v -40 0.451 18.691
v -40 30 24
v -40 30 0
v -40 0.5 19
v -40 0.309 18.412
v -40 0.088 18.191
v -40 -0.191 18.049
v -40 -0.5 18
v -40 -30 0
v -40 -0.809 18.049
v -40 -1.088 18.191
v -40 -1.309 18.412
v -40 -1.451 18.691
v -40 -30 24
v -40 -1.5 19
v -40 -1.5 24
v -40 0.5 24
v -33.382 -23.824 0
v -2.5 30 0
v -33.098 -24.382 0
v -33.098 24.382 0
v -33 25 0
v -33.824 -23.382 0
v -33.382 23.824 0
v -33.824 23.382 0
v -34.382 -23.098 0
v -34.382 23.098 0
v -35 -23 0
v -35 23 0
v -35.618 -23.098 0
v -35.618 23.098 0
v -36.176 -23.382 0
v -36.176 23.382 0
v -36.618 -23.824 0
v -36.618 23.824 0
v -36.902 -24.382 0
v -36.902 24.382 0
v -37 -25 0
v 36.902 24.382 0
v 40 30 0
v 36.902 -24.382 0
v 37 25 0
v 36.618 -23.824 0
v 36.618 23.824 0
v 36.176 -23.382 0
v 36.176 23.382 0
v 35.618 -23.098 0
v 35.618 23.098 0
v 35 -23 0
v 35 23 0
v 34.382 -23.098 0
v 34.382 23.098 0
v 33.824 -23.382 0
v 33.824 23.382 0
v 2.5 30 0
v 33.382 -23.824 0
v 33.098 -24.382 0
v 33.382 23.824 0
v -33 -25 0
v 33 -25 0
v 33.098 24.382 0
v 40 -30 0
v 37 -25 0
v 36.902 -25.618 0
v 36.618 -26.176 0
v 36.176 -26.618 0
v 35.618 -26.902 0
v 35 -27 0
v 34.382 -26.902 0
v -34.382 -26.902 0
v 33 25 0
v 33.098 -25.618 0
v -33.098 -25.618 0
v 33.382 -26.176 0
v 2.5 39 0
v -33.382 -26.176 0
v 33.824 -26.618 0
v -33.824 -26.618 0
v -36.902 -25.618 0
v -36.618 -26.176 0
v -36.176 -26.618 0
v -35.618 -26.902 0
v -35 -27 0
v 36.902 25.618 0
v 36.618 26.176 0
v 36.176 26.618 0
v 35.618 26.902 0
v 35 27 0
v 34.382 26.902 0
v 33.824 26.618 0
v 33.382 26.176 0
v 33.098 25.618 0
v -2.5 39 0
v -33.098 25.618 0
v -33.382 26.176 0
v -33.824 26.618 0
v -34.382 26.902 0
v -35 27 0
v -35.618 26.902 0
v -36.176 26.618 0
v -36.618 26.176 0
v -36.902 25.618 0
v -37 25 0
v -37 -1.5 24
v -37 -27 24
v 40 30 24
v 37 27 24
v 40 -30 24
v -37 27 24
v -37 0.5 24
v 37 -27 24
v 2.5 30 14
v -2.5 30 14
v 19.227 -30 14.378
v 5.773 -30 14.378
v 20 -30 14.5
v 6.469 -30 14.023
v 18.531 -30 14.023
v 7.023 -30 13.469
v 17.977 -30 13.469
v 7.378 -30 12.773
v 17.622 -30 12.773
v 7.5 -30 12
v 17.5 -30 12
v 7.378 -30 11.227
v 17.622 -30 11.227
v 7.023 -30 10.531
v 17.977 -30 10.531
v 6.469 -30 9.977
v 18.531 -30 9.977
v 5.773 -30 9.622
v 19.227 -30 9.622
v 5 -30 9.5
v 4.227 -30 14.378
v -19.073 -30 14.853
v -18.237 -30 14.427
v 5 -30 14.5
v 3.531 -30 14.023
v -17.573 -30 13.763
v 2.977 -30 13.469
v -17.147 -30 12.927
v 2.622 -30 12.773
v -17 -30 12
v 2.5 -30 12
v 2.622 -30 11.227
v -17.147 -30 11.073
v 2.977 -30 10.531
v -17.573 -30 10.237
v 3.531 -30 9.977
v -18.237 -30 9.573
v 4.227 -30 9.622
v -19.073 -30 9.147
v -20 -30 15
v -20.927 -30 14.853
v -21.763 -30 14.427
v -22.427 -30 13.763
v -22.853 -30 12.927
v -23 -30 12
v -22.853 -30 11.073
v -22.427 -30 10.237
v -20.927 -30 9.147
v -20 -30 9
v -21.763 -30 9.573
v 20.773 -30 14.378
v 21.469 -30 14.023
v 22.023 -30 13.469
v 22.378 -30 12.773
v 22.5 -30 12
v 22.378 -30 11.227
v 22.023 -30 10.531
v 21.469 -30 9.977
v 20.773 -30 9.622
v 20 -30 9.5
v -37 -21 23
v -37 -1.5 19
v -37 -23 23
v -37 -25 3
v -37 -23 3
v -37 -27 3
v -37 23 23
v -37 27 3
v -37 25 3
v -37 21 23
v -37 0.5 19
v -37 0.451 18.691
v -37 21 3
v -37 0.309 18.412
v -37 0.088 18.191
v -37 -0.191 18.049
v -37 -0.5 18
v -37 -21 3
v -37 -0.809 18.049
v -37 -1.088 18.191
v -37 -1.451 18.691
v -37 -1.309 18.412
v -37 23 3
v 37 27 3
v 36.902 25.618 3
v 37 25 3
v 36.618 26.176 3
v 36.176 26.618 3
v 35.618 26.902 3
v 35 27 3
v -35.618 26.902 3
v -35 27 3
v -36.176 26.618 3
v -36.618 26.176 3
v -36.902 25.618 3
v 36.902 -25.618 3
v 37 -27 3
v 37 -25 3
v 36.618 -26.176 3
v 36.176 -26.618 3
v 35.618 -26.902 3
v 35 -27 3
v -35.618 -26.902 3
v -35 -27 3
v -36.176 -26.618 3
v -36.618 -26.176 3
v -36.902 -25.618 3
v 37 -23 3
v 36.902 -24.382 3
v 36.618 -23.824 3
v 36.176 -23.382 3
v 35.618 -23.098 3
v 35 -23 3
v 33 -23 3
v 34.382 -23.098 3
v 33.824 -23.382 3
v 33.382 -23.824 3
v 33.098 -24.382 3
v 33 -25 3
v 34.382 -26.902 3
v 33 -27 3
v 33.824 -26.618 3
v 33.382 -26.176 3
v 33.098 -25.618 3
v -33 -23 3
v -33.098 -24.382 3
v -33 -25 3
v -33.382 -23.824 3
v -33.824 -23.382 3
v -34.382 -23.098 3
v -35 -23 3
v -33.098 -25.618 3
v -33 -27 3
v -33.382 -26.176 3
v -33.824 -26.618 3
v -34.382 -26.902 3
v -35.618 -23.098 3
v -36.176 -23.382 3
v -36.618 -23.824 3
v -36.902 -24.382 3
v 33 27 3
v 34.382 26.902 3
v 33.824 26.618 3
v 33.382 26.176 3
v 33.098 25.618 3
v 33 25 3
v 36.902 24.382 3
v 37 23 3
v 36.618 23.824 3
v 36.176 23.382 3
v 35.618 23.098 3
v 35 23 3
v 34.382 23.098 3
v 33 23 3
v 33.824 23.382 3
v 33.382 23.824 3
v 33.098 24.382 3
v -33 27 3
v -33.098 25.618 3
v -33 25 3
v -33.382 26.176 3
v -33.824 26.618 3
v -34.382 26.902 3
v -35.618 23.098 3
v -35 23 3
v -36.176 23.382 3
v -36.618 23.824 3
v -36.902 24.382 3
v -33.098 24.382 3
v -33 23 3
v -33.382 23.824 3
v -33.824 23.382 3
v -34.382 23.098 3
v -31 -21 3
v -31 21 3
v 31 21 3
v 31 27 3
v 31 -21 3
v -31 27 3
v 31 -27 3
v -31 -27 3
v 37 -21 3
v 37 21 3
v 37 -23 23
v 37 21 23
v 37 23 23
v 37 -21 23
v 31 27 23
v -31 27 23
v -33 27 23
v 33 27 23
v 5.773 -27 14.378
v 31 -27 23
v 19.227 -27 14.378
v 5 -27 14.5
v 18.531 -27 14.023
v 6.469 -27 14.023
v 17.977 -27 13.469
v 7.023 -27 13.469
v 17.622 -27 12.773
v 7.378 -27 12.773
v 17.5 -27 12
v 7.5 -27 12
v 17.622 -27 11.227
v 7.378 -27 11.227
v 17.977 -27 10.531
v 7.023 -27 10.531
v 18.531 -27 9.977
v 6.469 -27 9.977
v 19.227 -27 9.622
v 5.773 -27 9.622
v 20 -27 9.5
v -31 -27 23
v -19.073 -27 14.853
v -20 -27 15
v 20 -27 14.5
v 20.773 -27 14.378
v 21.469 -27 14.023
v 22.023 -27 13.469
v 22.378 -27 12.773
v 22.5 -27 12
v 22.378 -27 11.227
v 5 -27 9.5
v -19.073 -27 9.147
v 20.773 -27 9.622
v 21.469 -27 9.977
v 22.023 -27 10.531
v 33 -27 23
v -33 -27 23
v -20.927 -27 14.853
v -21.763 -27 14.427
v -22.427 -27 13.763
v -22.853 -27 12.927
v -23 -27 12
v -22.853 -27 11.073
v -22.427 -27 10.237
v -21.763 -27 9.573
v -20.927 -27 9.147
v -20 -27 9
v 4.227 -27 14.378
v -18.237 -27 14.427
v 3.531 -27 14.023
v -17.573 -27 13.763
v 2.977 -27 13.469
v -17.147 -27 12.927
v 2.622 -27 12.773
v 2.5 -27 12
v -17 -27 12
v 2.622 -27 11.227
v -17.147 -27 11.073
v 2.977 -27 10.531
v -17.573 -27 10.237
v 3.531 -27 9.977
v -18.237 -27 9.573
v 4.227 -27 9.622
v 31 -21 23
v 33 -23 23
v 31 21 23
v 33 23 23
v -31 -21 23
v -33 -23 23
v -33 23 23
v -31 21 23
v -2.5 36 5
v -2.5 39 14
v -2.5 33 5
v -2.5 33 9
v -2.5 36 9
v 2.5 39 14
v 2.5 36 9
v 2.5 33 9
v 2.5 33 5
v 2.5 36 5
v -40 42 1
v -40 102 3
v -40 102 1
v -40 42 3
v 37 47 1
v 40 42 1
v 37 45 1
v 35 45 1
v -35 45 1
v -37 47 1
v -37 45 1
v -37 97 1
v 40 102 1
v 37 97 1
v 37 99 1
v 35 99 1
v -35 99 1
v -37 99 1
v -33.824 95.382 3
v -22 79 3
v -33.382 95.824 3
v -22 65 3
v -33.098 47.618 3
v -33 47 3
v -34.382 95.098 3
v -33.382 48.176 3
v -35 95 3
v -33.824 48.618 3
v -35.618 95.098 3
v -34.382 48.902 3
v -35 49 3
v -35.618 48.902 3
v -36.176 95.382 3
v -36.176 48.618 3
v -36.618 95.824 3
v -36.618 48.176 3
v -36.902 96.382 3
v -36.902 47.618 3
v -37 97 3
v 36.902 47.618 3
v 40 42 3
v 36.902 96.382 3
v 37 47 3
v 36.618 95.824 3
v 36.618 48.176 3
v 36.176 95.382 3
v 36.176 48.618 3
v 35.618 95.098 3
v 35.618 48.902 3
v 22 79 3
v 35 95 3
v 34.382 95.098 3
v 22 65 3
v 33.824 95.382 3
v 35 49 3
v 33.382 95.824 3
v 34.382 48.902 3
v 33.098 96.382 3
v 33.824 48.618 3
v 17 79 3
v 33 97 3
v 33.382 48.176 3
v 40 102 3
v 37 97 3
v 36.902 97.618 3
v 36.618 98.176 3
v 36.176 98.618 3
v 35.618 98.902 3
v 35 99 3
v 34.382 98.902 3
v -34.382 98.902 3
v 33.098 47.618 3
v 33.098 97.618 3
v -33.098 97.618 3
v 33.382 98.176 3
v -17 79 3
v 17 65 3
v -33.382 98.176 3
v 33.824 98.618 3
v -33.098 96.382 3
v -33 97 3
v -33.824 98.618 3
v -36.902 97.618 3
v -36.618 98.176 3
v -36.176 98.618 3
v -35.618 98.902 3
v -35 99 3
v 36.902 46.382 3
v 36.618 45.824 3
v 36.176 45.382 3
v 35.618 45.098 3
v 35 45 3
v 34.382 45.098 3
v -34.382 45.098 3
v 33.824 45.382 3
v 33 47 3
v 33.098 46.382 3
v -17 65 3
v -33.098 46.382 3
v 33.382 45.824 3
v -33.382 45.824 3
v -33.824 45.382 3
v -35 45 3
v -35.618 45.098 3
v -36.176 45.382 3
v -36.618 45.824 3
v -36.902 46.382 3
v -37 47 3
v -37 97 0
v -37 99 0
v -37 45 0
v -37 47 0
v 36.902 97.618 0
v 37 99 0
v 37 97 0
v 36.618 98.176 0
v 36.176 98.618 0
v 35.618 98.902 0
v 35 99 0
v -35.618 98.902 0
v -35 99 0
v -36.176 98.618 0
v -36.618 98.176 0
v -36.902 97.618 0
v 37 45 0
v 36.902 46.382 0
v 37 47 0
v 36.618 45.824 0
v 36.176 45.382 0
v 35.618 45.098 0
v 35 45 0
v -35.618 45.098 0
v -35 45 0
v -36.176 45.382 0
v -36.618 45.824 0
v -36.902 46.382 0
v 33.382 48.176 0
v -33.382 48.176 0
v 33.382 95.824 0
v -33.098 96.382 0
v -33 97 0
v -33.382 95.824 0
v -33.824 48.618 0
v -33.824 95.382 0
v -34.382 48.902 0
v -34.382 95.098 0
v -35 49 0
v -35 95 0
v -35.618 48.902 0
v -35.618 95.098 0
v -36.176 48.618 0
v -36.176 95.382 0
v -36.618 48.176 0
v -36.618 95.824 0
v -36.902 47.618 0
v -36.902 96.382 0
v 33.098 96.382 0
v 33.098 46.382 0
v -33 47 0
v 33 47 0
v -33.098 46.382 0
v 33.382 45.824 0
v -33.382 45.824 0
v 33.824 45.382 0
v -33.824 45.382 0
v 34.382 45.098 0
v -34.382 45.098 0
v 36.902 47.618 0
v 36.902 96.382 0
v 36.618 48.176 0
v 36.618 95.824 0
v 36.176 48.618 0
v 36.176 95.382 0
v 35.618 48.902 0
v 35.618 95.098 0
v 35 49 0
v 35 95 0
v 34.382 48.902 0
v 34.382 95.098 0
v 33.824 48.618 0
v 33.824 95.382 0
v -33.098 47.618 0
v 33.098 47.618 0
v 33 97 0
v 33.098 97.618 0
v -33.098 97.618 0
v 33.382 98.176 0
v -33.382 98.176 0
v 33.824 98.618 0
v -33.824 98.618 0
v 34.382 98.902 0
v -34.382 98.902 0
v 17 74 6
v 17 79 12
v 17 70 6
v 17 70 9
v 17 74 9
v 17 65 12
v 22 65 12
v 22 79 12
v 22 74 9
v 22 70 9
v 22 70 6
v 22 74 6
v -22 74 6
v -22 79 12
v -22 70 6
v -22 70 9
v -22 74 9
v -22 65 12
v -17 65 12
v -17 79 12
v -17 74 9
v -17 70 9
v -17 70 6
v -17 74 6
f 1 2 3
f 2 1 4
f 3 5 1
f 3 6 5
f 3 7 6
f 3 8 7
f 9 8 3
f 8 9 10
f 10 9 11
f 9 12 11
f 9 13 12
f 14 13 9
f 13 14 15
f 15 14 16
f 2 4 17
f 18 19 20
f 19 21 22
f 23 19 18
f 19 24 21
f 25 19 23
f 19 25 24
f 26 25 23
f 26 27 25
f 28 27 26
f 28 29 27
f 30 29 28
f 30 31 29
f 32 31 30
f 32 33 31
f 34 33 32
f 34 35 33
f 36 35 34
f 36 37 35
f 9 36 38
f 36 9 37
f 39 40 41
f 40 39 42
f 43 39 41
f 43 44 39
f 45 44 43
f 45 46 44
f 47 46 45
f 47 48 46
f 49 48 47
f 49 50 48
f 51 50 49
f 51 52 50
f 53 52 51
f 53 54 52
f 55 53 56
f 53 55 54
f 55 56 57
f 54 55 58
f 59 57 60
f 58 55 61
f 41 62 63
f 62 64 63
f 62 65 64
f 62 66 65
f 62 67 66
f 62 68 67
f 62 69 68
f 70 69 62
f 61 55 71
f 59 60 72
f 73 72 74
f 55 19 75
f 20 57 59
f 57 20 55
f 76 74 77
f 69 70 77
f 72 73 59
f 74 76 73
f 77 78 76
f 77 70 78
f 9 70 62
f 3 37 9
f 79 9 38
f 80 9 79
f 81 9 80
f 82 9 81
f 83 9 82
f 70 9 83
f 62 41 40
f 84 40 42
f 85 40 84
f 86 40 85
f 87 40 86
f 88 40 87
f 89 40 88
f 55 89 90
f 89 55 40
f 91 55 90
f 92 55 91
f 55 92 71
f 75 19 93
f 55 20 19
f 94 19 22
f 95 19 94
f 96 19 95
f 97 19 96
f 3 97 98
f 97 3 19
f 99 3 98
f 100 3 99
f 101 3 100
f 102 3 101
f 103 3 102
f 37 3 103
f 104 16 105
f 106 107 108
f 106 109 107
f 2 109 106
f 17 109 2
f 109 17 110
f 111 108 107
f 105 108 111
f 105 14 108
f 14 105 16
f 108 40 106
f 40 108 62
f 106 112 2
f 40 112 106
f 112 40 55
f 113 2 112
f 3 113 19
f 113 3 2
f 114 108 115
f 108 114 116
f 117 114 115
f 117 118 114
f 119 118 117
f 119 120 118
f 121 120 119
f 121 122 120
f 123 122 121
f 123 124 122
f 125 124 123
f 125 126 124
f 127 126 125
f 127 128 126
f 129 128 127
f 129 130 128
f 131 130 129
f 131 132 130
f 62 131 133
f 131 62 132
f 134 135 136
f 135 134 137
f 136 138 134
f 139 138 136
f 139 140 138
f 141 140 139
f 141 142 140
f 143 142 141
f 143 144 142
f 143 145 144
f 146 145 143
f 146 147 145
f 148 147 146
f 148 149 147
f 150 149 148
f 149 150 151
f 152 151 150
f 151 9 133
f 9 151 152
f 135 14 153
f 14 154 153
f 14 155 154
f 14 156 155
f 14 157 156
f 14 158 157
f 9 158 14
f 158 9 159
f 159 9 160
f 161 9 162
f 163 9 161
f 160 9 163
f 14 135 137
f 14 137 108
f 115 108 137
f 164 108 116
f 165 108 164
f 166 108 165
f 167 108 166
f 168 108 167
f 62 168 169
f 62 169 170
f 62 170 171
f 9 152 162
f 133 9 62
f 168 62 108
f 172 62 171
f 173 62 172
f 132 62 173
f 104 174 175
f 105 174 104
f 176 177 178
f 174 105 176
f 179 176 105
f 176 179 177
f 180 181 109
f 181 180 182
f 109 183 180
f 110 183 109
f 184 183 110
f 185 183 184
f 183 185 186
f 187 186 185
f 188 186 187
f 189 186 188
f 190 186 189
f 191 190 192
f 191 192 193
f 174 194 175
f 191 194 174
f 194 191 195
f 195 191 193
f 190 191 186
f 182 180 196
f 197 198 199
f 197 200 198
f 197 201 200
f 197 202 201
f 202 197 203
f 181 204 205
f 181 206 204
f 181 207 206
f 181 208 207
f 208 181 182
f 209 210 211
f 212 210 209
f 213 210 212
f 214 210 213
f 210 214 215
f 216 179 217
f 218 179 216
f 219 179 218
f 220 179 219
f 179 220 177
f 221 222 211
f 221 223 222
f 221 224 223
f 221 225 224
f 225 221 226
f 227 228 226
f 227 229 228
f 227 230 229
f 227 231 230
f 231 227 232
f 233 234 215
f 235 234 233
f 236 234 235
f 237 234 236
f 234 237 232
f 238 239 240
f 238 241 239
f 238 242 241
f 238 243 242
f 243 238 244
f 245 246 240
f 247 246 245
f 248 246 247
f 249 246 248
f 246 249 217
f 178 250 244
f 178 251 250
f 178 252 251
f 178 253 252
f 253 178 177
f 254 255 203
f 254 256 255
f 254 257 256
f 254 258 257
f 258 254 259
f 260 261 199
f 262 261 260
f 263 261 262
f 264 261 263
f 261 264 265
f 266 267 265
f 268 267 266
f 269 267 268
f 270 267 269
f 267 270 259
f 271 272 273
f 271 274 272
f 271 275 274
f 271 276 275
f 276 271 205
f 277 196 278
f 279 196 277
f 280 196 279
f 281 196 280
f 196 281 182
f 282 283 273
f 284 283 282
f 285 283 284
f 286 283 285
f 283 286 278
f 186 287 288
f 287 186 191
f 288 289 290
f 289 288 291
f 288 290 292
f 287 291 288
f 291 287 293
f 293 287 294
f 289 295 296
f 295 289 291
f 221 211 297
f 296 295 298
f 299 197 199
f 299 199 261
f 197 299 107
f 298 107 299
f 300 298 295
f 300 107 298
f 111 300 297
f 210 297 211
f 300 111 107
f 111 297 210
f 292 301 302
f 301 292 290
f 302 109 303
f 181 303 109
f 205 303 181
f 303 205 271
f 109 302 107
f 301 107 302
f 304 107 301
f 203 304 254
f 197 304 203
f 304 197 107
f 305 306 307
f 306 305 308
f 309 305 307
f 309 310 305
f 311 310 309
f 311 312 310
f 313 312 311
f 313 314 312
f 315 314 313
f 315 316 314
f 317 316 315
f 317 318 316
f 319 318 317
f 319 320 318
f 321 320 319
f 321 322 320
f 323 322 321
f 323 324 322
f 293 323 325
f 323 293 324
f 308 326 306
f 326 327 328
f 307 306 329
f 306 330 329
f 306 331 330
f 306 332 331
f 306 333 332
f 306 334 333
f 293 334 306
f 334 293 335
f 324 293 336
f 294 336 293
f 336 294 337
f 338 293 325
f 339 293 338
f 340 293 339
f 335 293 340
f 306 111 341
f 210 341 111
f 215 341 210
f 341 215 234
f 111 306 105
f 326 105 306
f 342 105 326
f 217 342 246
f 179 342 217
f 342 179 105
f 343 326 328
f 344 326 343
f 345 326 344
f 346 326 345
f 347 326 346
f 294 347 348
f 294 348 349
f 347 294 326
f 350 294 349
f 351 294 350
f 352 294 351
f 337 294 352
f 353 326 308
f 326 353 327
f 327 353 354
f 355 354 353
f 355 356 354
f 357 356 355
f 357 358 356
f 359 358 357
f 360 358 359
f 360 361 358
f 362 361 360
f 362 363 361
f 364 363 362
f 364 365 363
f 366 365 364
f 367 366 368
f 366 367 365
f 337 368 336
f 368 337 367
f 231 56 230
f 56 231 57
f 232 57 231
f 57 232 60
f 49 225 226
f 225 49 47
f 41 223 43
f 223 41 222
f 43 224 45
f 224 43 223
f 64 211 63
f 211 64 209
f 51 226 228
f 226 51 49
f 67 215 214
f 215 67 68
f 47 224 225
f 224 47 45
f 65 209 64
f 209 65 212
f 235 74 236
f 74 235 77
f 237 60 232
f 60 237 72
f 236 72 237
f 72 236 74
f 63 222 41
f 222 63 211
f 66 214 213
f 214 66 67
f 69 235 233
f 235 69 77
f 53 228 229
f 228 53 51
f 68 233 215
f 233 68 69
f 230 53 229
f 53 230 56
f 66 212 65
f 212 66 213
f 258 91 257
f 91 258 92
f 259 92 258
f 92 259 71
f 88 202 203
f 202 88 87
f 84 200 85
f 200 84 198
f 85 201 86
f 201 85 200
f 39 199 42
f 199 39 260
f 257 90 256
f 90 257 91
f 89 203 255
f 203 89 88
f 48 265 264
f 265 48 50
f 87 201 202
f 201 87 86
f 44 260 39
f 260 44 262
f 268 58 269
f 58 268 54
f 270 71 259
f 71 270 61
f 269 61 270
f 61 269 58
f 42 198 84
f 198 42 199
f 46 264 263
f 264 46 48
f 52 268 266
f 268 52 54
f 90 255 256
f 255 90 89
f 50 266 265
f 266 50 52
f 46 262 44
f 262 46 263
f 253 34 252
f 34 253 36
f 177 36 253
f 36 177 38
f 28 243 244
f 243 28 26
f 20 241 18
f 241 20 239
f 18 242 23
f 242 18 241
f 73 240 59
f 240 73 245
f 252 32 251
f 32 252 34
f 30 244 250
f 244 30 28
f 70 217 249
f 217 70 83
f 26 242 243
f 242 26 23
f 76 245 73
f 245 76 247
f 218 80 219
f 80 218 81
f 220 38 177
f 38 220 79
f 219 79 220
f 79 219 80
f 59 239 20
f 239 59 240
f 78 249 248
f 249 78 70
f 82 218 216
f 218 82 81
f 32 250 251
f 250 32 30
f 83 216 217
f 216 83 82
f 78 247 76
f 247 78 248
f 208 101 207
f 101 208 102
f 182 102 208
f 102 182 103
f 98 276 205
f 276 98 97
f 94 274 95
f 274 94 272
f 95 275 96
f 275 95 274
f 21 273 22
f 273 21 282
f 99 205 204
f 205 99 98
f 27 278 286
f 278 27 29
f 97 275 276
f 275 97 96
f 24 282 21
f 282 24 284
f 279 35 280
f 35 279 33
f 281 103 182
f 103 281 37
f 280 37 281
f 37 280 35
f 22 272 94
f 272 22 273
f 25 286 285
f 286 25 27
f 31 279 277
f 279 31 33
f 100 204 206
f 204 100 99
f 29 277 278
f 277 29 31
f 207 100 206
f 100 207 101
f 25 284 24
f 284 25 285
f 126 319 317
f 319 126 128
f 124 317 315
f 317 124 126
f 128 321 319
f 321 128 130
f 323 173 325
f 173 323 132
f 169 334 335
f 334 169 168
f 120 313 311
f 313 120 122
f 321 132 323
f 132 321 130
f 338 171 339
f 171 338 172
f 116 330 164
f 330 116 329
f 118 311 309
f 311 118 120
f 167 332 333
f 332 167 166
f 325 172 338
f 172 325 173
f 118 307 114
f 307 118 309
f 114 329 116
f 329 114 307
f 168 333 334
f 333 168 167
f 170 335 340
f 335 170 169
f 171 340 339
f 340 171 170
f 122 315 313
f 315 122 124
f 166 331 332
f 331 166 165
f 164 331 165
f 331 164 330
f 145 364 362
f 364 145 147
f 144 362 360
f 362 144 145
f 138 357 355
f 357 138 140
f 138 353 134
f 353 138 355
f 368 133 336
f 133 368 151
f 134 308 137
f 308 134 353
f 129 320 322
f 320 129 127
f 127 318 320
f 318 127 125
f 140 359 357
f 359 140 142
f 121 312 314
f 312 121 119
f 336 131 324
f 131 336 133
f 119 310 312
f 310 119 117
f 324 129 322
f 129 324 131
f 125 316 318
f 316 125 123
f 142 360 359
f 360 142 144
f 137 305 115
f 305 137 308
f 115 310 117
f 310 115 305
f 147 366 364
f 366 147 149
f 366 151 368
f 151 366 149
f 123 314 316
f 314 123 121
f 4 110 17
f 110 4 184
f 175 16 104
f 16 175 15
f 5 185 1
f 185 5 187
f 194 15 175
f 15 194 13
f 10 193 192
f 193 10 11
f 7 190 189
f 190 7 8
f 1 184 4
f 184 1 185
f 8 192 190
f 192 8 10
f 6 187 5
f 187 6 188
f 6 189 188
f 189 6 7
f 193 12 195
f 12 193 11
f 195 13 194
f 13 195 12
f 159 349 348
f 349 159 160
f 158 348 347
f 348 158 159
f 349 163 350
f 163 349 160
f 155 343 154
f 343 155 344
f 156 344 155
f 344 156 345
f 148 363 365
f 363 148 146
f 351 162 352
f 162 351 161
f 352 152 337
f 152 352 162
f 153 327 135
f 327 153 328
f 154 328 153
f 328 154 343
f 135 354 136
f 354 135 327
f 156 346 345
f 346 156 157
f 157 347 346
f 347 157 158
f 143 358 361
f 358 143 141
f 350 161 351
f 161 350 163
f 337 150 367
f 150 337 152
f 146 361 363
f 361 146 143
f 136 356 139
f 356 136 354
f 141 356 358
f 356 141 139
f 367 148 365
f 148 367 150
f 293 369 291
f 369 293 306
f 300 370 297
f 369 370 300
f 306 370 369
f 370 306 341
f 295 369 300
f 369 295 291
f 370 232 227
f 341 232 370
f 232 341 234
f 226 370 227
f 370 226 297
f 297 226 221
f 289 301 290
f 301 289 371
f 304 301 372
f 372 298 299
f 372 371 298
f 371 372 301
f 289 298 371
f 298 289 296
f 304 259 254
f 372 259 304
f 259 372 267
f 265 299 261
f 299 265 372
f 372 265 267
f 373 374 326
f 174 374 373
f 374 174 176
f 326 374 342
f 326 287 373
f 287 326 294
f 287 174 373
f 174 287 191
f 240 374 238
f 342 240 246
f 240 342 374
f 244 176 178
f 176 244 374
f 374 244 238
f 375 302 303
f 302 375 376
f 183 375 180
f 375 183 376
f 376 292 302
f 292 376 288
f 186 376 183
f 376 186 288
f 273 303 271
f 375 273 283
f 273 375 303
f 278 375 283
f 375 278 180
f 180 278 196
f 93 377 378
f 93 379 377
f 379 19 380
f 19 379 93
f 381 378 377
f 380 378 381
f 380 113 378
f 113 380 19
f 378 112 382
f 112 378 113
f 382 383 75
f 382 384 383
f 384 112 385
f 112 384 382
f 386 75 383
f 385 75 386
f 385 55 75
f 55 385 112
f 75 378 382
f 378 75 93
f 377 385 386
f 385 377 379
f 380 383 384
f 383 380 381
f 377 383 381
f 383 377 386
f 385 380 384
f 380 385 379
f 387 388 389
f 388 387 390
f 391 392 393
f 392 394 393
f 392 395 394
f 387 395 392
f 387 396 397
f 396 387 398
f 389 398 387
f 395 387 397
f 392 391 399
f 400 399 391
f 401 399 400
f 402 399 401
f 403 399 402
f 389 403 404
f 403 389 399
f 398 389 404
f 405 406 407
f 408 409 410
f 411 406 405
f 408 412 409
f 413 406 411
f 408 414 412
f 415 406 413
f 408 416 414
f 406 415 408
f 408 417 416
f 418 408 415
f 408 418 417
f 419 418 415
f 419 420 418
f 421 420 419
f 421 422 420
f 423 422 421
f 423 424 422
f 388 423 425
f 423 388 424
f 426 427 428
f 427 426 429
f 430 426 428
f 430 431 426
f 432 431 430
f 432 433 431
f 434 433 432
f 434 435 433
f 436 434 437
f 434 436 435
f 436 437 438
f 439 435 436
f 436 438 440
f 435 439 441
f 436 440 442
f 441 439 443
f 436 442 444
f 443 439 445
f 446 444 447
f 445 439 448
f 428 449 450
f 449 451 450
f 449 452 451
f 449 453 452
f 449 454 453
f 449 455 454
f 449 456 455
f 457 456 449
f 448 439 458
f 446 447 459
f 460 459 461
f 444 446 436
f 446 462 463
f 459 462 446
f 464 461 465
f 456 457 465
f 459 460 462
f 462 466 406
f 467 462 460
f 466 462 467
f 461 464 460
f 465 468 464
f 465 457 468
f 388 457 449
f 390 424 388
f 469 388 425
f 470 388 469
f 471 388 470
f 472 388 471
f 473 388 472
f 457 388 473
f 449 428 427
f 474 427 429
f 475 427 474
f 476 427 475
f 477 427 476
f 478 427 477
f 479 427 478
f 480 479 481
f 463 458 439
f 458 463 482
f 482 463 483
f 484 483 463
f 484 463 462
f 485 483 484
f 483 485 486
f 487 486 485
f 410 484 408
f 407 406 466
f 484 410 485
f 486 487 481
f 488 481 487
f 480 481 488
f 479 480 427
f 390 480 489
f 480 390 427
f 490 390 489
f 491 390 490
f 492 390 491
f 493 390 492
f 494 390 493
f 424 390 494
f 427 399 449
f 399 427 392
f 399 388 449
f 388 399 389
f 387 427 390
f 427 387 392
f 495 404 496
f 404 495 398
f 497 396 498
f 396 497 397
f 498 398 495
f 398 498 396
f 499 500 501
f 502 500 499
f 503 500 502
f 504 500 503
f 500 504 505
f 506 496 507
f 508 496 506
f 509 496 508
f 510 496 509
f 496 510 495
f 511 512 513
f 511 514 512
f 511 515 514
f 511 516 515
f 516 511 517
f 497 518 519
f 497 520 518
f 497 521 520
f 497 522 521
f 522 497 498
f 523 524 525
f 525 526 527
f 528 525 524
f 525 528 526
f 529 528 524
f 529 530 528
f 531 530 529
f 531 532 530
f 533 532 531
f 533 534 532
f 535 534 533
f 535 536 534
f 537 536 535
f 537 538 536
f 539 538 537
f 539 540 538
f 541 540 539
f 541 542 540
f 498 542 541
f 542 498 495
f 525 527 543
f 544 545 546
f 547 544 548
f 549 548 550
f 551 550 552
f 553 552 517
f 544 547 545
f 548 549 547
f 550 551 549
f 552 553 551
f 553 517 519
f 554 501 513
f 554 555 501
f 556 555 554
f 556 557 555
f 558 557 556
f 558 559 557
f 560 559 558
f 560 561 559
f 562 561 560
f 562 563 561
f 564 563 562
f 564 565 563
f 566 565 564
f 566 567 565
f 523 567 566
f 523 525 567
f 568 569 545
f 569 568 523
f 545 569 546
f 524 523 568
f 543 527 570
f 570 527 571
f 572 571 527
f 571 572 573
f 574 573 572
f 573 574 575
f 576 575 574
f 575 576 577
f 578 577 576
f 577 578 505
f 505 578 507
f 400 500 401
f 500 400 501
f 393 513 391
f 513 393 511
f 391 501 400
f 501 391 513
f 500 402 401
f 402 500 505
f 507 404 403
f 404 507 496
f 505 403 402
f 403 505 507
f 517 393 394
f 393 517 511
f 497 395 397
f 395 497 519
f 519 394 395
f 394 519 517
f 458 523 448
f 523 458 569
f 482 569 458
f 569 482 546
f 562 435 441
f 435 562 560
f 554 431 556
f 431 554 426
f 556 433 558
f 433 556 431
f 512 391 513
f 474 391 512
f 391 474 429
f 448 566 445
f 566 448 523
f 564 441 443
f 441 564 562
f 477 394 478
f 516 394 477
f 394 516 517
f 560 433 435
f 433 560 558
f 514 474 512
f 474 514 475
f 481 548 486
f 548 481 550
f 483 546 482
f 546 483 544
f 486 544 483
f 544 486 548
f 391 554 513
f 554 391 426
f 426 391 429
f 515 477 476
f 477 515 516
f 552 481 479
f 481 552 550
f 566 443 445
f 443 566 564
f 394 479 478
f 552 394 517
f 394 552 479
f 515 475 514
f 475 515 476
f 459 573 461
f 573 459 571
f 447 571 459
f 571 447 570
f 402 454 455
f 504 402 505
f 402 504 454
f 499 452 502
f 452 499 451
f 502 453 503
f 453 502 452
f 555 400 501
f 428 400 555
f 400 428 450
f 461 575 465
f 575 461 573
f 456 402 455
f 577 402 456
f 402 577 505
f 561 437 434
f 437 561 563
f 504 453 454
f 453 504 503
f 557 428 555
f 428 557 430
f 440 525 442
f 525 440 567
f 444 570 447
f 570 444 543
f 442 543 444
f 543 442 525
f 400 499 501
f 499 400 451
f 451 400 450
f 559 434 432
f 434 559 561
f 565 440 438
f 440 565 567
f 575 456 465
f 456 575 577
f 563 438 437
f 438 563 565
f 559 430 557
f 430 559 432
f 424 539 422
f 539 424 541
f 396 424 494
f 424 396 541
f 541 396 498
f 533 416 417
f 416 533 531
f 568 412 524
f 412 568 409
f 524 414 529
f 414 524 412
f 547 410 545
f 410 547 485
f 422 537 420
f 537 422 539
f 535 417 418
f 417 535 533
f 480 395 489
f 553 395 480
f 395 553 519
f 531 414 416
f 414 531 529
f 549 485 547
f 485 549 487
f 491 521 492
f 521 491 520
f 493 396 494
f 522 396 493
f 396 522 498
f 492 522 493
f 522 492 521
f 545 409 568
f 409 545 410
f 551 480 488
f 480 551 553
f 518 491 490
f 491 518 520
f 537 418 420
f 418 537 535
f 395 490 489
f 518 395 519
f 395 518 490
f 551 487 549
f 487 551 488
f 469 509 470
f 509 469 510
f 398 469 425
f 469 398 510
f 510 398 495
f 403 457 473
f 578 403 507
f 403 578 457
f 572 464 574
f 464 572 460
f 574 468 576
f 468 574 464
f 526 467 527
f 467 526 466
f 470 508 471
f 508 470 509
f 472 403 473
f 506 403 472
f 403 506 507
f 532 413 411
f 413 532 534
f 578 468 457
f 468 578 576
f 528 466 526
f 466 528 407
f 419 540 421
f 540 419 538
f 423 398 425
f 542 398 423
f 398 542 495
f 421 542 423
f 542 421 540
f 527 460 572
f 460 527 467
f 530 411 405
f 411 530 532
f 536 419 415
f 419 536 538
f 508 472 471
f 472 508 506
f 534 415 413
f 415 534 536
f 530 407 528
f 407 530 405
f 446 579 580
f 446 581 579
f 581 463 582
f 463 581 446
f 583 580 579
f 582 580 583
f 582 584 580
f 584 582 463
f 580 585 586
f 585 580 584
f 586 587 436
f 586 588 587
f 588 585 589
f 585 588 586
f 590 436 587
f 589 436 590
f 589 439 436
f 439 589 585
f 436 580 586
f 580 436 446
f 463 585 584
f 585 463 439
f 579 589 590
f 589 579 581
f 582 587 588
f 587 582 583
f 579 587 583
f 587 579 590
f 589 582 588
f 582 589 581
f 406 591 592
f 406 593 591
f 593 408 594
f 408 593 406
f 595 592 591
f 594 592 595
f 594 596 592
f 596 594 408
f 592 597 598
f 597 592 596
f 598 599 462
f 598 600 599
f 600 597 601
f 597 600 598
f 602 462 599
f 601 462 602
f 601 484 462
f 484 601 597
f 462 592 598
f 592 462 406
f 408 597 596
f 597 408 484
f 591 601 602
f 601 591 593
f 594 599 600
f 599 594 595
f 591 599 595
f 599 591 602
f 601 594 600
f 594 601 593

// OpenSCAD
profile = 0;

// sizes in mm
width = 80;
height = 60;
depth = 24; 
thickness = 3;
coverThickness = 2;
coverDepth = 1;
coverOffset = 0;
holeRadius = 2;

mountWidth = 14;
mountHeigth = 10;
mounthDepth = 5;

controlsOffset = 20;
ledRadius = 2.5;
ledXPosition = controlsOffset;
switchRadius = 3;
switchXPosition = width - controlsOffset;

holeHeigth = thickness;
bottomHoleOffset = depth - thickness;
holePosition = 2 * thickness - 1;
widthInside = width - (2 * thickness);
heightInside = height - (2 * thickness);

module box() {
    difference() {
        cube([width, height, depth], false);
        translate([thickness, thickness, -thickness]) {
            cube([widthInside, heightInside, depth], false);
        }
    }
}

module hole(x, y, z) {
    translate([x, y, z]) {
        cylinder(holeHeigth, holeRadius, holeRadius,$fn=20, false);
    }
}

module holes(bottomOffset) {
    hole(holePosition, holePosition, bottomOffset);
    hole(holePosition, heightInside + 1, bottomOffset);
    hole(widthInside + 1, holePosition, bottomOffset);
    hole(widthInside + 1, heightInside + 1, bottomOffset);
}

module holeBox(x, y) {
    translate([x, y, 1]) {
        difference() {
            cube([8, 8, depth - 1 - thickness]);
            translate([2, 2, 0]) {
                cube([4, 4, depth - 1 - thickness]);
            }
        }
    }
}

module holeBoxes() {
    holeBox(1, 1);
    holeBox(1, heightInside - thickness);
    holeBox(widthInside - thickness, 1);
    holeBox(widthInside - thickness, heightInside - thickness);
}

module cover() {
    translate([0, 0, coverOffset]) {
        cube([width, height, coverThickness], false);
        translate([thickness, thickness, coverThickness]) {
            cube([widthInside, heightInside, coverDepth], false);
        }
    }
}

module ledHoles() {
    halfDepth = depth / 2;
    translate([ledXPosition, thickness + 1, halfDepth]) {
        rotate([90, 0, 0]) {
            heigth = thickness + 2;
            cylinder(heigth, ledRadius, ledRadius,$fn=20, false);
            translate([15, 0 ,0]) {
                cylinder(heigth, ledRadius, ledRadius,$fn=20, false);
            }
        }
    }
}

module switchHole() {
    halfDepth = depth / 2;
    translate([switchXPosition, thickness + 1, halfDepth]) {
        rotate([90, 0, 0]) {
            heigth = thickness + 2;
            cylinder(heigth, switchRadius, switchRadius,$fn=20, false);
        }
    }
}

module mount(x) {
    translate([x, (height - mountWidth) / 2, -(coverOffset + mountHeigth - 1)]) {
        difference() {
            cube([mounthDepth, mountWidth, mountHeigth], false);
            translate([0, (mountWidth - 4) / 2, 3]) {
                cube([mounthDepth, 4, 3], false);
            }
        }
    }
}

module verticalMount() {
    translate([(width - mounthDepth) / 2, height - 1, (depth - mountWidth)]) {
            difference() {
            cube([mounthDepth, mountHeigth, mountWidth], false);
            translate([0, 4, (mountWidth - 4) / 2]) {
                cube([mounthDepth, 3, 4], false);
            }
        }
    }
}

module sensorHoles() {
    translate([width - 3, (height - 1) / 2 - 1, 0]) {
        cube([3, 2, 5], false);
    }
    translate([thickness, (height - 1) / 2, 5]) {
        rotate([0, 90, 0]) {
            cylinder(width, 1, 1,$fn=20, false);
        }
    }
}

module model() {
    difference() {
        box();
        holes(bottomHoleOffset);
        ledHoles();
        switchHole();
        sensorHoles();
    }
    
    holeBoxes();
    verticalMount();
    
    translation = profile == 1 
        ? [0, 0, -4] 
        : [0, 72, depth - thickness];
    
    translate(translation) {
        difference() {
            cover();
            holes(coverOffset);
        }
        mount(18);
        mount(57);
    }
}

rotate([0, 180, 0]) {
    translate([-width/2, -height/2, -depth]) {
        difference() {
            model();
            if (profile == 1) {
                translate([0, height / 2, -30]) {
                    cube([width / 2, height, 60], false);
                }
            }
        }
    }
}
